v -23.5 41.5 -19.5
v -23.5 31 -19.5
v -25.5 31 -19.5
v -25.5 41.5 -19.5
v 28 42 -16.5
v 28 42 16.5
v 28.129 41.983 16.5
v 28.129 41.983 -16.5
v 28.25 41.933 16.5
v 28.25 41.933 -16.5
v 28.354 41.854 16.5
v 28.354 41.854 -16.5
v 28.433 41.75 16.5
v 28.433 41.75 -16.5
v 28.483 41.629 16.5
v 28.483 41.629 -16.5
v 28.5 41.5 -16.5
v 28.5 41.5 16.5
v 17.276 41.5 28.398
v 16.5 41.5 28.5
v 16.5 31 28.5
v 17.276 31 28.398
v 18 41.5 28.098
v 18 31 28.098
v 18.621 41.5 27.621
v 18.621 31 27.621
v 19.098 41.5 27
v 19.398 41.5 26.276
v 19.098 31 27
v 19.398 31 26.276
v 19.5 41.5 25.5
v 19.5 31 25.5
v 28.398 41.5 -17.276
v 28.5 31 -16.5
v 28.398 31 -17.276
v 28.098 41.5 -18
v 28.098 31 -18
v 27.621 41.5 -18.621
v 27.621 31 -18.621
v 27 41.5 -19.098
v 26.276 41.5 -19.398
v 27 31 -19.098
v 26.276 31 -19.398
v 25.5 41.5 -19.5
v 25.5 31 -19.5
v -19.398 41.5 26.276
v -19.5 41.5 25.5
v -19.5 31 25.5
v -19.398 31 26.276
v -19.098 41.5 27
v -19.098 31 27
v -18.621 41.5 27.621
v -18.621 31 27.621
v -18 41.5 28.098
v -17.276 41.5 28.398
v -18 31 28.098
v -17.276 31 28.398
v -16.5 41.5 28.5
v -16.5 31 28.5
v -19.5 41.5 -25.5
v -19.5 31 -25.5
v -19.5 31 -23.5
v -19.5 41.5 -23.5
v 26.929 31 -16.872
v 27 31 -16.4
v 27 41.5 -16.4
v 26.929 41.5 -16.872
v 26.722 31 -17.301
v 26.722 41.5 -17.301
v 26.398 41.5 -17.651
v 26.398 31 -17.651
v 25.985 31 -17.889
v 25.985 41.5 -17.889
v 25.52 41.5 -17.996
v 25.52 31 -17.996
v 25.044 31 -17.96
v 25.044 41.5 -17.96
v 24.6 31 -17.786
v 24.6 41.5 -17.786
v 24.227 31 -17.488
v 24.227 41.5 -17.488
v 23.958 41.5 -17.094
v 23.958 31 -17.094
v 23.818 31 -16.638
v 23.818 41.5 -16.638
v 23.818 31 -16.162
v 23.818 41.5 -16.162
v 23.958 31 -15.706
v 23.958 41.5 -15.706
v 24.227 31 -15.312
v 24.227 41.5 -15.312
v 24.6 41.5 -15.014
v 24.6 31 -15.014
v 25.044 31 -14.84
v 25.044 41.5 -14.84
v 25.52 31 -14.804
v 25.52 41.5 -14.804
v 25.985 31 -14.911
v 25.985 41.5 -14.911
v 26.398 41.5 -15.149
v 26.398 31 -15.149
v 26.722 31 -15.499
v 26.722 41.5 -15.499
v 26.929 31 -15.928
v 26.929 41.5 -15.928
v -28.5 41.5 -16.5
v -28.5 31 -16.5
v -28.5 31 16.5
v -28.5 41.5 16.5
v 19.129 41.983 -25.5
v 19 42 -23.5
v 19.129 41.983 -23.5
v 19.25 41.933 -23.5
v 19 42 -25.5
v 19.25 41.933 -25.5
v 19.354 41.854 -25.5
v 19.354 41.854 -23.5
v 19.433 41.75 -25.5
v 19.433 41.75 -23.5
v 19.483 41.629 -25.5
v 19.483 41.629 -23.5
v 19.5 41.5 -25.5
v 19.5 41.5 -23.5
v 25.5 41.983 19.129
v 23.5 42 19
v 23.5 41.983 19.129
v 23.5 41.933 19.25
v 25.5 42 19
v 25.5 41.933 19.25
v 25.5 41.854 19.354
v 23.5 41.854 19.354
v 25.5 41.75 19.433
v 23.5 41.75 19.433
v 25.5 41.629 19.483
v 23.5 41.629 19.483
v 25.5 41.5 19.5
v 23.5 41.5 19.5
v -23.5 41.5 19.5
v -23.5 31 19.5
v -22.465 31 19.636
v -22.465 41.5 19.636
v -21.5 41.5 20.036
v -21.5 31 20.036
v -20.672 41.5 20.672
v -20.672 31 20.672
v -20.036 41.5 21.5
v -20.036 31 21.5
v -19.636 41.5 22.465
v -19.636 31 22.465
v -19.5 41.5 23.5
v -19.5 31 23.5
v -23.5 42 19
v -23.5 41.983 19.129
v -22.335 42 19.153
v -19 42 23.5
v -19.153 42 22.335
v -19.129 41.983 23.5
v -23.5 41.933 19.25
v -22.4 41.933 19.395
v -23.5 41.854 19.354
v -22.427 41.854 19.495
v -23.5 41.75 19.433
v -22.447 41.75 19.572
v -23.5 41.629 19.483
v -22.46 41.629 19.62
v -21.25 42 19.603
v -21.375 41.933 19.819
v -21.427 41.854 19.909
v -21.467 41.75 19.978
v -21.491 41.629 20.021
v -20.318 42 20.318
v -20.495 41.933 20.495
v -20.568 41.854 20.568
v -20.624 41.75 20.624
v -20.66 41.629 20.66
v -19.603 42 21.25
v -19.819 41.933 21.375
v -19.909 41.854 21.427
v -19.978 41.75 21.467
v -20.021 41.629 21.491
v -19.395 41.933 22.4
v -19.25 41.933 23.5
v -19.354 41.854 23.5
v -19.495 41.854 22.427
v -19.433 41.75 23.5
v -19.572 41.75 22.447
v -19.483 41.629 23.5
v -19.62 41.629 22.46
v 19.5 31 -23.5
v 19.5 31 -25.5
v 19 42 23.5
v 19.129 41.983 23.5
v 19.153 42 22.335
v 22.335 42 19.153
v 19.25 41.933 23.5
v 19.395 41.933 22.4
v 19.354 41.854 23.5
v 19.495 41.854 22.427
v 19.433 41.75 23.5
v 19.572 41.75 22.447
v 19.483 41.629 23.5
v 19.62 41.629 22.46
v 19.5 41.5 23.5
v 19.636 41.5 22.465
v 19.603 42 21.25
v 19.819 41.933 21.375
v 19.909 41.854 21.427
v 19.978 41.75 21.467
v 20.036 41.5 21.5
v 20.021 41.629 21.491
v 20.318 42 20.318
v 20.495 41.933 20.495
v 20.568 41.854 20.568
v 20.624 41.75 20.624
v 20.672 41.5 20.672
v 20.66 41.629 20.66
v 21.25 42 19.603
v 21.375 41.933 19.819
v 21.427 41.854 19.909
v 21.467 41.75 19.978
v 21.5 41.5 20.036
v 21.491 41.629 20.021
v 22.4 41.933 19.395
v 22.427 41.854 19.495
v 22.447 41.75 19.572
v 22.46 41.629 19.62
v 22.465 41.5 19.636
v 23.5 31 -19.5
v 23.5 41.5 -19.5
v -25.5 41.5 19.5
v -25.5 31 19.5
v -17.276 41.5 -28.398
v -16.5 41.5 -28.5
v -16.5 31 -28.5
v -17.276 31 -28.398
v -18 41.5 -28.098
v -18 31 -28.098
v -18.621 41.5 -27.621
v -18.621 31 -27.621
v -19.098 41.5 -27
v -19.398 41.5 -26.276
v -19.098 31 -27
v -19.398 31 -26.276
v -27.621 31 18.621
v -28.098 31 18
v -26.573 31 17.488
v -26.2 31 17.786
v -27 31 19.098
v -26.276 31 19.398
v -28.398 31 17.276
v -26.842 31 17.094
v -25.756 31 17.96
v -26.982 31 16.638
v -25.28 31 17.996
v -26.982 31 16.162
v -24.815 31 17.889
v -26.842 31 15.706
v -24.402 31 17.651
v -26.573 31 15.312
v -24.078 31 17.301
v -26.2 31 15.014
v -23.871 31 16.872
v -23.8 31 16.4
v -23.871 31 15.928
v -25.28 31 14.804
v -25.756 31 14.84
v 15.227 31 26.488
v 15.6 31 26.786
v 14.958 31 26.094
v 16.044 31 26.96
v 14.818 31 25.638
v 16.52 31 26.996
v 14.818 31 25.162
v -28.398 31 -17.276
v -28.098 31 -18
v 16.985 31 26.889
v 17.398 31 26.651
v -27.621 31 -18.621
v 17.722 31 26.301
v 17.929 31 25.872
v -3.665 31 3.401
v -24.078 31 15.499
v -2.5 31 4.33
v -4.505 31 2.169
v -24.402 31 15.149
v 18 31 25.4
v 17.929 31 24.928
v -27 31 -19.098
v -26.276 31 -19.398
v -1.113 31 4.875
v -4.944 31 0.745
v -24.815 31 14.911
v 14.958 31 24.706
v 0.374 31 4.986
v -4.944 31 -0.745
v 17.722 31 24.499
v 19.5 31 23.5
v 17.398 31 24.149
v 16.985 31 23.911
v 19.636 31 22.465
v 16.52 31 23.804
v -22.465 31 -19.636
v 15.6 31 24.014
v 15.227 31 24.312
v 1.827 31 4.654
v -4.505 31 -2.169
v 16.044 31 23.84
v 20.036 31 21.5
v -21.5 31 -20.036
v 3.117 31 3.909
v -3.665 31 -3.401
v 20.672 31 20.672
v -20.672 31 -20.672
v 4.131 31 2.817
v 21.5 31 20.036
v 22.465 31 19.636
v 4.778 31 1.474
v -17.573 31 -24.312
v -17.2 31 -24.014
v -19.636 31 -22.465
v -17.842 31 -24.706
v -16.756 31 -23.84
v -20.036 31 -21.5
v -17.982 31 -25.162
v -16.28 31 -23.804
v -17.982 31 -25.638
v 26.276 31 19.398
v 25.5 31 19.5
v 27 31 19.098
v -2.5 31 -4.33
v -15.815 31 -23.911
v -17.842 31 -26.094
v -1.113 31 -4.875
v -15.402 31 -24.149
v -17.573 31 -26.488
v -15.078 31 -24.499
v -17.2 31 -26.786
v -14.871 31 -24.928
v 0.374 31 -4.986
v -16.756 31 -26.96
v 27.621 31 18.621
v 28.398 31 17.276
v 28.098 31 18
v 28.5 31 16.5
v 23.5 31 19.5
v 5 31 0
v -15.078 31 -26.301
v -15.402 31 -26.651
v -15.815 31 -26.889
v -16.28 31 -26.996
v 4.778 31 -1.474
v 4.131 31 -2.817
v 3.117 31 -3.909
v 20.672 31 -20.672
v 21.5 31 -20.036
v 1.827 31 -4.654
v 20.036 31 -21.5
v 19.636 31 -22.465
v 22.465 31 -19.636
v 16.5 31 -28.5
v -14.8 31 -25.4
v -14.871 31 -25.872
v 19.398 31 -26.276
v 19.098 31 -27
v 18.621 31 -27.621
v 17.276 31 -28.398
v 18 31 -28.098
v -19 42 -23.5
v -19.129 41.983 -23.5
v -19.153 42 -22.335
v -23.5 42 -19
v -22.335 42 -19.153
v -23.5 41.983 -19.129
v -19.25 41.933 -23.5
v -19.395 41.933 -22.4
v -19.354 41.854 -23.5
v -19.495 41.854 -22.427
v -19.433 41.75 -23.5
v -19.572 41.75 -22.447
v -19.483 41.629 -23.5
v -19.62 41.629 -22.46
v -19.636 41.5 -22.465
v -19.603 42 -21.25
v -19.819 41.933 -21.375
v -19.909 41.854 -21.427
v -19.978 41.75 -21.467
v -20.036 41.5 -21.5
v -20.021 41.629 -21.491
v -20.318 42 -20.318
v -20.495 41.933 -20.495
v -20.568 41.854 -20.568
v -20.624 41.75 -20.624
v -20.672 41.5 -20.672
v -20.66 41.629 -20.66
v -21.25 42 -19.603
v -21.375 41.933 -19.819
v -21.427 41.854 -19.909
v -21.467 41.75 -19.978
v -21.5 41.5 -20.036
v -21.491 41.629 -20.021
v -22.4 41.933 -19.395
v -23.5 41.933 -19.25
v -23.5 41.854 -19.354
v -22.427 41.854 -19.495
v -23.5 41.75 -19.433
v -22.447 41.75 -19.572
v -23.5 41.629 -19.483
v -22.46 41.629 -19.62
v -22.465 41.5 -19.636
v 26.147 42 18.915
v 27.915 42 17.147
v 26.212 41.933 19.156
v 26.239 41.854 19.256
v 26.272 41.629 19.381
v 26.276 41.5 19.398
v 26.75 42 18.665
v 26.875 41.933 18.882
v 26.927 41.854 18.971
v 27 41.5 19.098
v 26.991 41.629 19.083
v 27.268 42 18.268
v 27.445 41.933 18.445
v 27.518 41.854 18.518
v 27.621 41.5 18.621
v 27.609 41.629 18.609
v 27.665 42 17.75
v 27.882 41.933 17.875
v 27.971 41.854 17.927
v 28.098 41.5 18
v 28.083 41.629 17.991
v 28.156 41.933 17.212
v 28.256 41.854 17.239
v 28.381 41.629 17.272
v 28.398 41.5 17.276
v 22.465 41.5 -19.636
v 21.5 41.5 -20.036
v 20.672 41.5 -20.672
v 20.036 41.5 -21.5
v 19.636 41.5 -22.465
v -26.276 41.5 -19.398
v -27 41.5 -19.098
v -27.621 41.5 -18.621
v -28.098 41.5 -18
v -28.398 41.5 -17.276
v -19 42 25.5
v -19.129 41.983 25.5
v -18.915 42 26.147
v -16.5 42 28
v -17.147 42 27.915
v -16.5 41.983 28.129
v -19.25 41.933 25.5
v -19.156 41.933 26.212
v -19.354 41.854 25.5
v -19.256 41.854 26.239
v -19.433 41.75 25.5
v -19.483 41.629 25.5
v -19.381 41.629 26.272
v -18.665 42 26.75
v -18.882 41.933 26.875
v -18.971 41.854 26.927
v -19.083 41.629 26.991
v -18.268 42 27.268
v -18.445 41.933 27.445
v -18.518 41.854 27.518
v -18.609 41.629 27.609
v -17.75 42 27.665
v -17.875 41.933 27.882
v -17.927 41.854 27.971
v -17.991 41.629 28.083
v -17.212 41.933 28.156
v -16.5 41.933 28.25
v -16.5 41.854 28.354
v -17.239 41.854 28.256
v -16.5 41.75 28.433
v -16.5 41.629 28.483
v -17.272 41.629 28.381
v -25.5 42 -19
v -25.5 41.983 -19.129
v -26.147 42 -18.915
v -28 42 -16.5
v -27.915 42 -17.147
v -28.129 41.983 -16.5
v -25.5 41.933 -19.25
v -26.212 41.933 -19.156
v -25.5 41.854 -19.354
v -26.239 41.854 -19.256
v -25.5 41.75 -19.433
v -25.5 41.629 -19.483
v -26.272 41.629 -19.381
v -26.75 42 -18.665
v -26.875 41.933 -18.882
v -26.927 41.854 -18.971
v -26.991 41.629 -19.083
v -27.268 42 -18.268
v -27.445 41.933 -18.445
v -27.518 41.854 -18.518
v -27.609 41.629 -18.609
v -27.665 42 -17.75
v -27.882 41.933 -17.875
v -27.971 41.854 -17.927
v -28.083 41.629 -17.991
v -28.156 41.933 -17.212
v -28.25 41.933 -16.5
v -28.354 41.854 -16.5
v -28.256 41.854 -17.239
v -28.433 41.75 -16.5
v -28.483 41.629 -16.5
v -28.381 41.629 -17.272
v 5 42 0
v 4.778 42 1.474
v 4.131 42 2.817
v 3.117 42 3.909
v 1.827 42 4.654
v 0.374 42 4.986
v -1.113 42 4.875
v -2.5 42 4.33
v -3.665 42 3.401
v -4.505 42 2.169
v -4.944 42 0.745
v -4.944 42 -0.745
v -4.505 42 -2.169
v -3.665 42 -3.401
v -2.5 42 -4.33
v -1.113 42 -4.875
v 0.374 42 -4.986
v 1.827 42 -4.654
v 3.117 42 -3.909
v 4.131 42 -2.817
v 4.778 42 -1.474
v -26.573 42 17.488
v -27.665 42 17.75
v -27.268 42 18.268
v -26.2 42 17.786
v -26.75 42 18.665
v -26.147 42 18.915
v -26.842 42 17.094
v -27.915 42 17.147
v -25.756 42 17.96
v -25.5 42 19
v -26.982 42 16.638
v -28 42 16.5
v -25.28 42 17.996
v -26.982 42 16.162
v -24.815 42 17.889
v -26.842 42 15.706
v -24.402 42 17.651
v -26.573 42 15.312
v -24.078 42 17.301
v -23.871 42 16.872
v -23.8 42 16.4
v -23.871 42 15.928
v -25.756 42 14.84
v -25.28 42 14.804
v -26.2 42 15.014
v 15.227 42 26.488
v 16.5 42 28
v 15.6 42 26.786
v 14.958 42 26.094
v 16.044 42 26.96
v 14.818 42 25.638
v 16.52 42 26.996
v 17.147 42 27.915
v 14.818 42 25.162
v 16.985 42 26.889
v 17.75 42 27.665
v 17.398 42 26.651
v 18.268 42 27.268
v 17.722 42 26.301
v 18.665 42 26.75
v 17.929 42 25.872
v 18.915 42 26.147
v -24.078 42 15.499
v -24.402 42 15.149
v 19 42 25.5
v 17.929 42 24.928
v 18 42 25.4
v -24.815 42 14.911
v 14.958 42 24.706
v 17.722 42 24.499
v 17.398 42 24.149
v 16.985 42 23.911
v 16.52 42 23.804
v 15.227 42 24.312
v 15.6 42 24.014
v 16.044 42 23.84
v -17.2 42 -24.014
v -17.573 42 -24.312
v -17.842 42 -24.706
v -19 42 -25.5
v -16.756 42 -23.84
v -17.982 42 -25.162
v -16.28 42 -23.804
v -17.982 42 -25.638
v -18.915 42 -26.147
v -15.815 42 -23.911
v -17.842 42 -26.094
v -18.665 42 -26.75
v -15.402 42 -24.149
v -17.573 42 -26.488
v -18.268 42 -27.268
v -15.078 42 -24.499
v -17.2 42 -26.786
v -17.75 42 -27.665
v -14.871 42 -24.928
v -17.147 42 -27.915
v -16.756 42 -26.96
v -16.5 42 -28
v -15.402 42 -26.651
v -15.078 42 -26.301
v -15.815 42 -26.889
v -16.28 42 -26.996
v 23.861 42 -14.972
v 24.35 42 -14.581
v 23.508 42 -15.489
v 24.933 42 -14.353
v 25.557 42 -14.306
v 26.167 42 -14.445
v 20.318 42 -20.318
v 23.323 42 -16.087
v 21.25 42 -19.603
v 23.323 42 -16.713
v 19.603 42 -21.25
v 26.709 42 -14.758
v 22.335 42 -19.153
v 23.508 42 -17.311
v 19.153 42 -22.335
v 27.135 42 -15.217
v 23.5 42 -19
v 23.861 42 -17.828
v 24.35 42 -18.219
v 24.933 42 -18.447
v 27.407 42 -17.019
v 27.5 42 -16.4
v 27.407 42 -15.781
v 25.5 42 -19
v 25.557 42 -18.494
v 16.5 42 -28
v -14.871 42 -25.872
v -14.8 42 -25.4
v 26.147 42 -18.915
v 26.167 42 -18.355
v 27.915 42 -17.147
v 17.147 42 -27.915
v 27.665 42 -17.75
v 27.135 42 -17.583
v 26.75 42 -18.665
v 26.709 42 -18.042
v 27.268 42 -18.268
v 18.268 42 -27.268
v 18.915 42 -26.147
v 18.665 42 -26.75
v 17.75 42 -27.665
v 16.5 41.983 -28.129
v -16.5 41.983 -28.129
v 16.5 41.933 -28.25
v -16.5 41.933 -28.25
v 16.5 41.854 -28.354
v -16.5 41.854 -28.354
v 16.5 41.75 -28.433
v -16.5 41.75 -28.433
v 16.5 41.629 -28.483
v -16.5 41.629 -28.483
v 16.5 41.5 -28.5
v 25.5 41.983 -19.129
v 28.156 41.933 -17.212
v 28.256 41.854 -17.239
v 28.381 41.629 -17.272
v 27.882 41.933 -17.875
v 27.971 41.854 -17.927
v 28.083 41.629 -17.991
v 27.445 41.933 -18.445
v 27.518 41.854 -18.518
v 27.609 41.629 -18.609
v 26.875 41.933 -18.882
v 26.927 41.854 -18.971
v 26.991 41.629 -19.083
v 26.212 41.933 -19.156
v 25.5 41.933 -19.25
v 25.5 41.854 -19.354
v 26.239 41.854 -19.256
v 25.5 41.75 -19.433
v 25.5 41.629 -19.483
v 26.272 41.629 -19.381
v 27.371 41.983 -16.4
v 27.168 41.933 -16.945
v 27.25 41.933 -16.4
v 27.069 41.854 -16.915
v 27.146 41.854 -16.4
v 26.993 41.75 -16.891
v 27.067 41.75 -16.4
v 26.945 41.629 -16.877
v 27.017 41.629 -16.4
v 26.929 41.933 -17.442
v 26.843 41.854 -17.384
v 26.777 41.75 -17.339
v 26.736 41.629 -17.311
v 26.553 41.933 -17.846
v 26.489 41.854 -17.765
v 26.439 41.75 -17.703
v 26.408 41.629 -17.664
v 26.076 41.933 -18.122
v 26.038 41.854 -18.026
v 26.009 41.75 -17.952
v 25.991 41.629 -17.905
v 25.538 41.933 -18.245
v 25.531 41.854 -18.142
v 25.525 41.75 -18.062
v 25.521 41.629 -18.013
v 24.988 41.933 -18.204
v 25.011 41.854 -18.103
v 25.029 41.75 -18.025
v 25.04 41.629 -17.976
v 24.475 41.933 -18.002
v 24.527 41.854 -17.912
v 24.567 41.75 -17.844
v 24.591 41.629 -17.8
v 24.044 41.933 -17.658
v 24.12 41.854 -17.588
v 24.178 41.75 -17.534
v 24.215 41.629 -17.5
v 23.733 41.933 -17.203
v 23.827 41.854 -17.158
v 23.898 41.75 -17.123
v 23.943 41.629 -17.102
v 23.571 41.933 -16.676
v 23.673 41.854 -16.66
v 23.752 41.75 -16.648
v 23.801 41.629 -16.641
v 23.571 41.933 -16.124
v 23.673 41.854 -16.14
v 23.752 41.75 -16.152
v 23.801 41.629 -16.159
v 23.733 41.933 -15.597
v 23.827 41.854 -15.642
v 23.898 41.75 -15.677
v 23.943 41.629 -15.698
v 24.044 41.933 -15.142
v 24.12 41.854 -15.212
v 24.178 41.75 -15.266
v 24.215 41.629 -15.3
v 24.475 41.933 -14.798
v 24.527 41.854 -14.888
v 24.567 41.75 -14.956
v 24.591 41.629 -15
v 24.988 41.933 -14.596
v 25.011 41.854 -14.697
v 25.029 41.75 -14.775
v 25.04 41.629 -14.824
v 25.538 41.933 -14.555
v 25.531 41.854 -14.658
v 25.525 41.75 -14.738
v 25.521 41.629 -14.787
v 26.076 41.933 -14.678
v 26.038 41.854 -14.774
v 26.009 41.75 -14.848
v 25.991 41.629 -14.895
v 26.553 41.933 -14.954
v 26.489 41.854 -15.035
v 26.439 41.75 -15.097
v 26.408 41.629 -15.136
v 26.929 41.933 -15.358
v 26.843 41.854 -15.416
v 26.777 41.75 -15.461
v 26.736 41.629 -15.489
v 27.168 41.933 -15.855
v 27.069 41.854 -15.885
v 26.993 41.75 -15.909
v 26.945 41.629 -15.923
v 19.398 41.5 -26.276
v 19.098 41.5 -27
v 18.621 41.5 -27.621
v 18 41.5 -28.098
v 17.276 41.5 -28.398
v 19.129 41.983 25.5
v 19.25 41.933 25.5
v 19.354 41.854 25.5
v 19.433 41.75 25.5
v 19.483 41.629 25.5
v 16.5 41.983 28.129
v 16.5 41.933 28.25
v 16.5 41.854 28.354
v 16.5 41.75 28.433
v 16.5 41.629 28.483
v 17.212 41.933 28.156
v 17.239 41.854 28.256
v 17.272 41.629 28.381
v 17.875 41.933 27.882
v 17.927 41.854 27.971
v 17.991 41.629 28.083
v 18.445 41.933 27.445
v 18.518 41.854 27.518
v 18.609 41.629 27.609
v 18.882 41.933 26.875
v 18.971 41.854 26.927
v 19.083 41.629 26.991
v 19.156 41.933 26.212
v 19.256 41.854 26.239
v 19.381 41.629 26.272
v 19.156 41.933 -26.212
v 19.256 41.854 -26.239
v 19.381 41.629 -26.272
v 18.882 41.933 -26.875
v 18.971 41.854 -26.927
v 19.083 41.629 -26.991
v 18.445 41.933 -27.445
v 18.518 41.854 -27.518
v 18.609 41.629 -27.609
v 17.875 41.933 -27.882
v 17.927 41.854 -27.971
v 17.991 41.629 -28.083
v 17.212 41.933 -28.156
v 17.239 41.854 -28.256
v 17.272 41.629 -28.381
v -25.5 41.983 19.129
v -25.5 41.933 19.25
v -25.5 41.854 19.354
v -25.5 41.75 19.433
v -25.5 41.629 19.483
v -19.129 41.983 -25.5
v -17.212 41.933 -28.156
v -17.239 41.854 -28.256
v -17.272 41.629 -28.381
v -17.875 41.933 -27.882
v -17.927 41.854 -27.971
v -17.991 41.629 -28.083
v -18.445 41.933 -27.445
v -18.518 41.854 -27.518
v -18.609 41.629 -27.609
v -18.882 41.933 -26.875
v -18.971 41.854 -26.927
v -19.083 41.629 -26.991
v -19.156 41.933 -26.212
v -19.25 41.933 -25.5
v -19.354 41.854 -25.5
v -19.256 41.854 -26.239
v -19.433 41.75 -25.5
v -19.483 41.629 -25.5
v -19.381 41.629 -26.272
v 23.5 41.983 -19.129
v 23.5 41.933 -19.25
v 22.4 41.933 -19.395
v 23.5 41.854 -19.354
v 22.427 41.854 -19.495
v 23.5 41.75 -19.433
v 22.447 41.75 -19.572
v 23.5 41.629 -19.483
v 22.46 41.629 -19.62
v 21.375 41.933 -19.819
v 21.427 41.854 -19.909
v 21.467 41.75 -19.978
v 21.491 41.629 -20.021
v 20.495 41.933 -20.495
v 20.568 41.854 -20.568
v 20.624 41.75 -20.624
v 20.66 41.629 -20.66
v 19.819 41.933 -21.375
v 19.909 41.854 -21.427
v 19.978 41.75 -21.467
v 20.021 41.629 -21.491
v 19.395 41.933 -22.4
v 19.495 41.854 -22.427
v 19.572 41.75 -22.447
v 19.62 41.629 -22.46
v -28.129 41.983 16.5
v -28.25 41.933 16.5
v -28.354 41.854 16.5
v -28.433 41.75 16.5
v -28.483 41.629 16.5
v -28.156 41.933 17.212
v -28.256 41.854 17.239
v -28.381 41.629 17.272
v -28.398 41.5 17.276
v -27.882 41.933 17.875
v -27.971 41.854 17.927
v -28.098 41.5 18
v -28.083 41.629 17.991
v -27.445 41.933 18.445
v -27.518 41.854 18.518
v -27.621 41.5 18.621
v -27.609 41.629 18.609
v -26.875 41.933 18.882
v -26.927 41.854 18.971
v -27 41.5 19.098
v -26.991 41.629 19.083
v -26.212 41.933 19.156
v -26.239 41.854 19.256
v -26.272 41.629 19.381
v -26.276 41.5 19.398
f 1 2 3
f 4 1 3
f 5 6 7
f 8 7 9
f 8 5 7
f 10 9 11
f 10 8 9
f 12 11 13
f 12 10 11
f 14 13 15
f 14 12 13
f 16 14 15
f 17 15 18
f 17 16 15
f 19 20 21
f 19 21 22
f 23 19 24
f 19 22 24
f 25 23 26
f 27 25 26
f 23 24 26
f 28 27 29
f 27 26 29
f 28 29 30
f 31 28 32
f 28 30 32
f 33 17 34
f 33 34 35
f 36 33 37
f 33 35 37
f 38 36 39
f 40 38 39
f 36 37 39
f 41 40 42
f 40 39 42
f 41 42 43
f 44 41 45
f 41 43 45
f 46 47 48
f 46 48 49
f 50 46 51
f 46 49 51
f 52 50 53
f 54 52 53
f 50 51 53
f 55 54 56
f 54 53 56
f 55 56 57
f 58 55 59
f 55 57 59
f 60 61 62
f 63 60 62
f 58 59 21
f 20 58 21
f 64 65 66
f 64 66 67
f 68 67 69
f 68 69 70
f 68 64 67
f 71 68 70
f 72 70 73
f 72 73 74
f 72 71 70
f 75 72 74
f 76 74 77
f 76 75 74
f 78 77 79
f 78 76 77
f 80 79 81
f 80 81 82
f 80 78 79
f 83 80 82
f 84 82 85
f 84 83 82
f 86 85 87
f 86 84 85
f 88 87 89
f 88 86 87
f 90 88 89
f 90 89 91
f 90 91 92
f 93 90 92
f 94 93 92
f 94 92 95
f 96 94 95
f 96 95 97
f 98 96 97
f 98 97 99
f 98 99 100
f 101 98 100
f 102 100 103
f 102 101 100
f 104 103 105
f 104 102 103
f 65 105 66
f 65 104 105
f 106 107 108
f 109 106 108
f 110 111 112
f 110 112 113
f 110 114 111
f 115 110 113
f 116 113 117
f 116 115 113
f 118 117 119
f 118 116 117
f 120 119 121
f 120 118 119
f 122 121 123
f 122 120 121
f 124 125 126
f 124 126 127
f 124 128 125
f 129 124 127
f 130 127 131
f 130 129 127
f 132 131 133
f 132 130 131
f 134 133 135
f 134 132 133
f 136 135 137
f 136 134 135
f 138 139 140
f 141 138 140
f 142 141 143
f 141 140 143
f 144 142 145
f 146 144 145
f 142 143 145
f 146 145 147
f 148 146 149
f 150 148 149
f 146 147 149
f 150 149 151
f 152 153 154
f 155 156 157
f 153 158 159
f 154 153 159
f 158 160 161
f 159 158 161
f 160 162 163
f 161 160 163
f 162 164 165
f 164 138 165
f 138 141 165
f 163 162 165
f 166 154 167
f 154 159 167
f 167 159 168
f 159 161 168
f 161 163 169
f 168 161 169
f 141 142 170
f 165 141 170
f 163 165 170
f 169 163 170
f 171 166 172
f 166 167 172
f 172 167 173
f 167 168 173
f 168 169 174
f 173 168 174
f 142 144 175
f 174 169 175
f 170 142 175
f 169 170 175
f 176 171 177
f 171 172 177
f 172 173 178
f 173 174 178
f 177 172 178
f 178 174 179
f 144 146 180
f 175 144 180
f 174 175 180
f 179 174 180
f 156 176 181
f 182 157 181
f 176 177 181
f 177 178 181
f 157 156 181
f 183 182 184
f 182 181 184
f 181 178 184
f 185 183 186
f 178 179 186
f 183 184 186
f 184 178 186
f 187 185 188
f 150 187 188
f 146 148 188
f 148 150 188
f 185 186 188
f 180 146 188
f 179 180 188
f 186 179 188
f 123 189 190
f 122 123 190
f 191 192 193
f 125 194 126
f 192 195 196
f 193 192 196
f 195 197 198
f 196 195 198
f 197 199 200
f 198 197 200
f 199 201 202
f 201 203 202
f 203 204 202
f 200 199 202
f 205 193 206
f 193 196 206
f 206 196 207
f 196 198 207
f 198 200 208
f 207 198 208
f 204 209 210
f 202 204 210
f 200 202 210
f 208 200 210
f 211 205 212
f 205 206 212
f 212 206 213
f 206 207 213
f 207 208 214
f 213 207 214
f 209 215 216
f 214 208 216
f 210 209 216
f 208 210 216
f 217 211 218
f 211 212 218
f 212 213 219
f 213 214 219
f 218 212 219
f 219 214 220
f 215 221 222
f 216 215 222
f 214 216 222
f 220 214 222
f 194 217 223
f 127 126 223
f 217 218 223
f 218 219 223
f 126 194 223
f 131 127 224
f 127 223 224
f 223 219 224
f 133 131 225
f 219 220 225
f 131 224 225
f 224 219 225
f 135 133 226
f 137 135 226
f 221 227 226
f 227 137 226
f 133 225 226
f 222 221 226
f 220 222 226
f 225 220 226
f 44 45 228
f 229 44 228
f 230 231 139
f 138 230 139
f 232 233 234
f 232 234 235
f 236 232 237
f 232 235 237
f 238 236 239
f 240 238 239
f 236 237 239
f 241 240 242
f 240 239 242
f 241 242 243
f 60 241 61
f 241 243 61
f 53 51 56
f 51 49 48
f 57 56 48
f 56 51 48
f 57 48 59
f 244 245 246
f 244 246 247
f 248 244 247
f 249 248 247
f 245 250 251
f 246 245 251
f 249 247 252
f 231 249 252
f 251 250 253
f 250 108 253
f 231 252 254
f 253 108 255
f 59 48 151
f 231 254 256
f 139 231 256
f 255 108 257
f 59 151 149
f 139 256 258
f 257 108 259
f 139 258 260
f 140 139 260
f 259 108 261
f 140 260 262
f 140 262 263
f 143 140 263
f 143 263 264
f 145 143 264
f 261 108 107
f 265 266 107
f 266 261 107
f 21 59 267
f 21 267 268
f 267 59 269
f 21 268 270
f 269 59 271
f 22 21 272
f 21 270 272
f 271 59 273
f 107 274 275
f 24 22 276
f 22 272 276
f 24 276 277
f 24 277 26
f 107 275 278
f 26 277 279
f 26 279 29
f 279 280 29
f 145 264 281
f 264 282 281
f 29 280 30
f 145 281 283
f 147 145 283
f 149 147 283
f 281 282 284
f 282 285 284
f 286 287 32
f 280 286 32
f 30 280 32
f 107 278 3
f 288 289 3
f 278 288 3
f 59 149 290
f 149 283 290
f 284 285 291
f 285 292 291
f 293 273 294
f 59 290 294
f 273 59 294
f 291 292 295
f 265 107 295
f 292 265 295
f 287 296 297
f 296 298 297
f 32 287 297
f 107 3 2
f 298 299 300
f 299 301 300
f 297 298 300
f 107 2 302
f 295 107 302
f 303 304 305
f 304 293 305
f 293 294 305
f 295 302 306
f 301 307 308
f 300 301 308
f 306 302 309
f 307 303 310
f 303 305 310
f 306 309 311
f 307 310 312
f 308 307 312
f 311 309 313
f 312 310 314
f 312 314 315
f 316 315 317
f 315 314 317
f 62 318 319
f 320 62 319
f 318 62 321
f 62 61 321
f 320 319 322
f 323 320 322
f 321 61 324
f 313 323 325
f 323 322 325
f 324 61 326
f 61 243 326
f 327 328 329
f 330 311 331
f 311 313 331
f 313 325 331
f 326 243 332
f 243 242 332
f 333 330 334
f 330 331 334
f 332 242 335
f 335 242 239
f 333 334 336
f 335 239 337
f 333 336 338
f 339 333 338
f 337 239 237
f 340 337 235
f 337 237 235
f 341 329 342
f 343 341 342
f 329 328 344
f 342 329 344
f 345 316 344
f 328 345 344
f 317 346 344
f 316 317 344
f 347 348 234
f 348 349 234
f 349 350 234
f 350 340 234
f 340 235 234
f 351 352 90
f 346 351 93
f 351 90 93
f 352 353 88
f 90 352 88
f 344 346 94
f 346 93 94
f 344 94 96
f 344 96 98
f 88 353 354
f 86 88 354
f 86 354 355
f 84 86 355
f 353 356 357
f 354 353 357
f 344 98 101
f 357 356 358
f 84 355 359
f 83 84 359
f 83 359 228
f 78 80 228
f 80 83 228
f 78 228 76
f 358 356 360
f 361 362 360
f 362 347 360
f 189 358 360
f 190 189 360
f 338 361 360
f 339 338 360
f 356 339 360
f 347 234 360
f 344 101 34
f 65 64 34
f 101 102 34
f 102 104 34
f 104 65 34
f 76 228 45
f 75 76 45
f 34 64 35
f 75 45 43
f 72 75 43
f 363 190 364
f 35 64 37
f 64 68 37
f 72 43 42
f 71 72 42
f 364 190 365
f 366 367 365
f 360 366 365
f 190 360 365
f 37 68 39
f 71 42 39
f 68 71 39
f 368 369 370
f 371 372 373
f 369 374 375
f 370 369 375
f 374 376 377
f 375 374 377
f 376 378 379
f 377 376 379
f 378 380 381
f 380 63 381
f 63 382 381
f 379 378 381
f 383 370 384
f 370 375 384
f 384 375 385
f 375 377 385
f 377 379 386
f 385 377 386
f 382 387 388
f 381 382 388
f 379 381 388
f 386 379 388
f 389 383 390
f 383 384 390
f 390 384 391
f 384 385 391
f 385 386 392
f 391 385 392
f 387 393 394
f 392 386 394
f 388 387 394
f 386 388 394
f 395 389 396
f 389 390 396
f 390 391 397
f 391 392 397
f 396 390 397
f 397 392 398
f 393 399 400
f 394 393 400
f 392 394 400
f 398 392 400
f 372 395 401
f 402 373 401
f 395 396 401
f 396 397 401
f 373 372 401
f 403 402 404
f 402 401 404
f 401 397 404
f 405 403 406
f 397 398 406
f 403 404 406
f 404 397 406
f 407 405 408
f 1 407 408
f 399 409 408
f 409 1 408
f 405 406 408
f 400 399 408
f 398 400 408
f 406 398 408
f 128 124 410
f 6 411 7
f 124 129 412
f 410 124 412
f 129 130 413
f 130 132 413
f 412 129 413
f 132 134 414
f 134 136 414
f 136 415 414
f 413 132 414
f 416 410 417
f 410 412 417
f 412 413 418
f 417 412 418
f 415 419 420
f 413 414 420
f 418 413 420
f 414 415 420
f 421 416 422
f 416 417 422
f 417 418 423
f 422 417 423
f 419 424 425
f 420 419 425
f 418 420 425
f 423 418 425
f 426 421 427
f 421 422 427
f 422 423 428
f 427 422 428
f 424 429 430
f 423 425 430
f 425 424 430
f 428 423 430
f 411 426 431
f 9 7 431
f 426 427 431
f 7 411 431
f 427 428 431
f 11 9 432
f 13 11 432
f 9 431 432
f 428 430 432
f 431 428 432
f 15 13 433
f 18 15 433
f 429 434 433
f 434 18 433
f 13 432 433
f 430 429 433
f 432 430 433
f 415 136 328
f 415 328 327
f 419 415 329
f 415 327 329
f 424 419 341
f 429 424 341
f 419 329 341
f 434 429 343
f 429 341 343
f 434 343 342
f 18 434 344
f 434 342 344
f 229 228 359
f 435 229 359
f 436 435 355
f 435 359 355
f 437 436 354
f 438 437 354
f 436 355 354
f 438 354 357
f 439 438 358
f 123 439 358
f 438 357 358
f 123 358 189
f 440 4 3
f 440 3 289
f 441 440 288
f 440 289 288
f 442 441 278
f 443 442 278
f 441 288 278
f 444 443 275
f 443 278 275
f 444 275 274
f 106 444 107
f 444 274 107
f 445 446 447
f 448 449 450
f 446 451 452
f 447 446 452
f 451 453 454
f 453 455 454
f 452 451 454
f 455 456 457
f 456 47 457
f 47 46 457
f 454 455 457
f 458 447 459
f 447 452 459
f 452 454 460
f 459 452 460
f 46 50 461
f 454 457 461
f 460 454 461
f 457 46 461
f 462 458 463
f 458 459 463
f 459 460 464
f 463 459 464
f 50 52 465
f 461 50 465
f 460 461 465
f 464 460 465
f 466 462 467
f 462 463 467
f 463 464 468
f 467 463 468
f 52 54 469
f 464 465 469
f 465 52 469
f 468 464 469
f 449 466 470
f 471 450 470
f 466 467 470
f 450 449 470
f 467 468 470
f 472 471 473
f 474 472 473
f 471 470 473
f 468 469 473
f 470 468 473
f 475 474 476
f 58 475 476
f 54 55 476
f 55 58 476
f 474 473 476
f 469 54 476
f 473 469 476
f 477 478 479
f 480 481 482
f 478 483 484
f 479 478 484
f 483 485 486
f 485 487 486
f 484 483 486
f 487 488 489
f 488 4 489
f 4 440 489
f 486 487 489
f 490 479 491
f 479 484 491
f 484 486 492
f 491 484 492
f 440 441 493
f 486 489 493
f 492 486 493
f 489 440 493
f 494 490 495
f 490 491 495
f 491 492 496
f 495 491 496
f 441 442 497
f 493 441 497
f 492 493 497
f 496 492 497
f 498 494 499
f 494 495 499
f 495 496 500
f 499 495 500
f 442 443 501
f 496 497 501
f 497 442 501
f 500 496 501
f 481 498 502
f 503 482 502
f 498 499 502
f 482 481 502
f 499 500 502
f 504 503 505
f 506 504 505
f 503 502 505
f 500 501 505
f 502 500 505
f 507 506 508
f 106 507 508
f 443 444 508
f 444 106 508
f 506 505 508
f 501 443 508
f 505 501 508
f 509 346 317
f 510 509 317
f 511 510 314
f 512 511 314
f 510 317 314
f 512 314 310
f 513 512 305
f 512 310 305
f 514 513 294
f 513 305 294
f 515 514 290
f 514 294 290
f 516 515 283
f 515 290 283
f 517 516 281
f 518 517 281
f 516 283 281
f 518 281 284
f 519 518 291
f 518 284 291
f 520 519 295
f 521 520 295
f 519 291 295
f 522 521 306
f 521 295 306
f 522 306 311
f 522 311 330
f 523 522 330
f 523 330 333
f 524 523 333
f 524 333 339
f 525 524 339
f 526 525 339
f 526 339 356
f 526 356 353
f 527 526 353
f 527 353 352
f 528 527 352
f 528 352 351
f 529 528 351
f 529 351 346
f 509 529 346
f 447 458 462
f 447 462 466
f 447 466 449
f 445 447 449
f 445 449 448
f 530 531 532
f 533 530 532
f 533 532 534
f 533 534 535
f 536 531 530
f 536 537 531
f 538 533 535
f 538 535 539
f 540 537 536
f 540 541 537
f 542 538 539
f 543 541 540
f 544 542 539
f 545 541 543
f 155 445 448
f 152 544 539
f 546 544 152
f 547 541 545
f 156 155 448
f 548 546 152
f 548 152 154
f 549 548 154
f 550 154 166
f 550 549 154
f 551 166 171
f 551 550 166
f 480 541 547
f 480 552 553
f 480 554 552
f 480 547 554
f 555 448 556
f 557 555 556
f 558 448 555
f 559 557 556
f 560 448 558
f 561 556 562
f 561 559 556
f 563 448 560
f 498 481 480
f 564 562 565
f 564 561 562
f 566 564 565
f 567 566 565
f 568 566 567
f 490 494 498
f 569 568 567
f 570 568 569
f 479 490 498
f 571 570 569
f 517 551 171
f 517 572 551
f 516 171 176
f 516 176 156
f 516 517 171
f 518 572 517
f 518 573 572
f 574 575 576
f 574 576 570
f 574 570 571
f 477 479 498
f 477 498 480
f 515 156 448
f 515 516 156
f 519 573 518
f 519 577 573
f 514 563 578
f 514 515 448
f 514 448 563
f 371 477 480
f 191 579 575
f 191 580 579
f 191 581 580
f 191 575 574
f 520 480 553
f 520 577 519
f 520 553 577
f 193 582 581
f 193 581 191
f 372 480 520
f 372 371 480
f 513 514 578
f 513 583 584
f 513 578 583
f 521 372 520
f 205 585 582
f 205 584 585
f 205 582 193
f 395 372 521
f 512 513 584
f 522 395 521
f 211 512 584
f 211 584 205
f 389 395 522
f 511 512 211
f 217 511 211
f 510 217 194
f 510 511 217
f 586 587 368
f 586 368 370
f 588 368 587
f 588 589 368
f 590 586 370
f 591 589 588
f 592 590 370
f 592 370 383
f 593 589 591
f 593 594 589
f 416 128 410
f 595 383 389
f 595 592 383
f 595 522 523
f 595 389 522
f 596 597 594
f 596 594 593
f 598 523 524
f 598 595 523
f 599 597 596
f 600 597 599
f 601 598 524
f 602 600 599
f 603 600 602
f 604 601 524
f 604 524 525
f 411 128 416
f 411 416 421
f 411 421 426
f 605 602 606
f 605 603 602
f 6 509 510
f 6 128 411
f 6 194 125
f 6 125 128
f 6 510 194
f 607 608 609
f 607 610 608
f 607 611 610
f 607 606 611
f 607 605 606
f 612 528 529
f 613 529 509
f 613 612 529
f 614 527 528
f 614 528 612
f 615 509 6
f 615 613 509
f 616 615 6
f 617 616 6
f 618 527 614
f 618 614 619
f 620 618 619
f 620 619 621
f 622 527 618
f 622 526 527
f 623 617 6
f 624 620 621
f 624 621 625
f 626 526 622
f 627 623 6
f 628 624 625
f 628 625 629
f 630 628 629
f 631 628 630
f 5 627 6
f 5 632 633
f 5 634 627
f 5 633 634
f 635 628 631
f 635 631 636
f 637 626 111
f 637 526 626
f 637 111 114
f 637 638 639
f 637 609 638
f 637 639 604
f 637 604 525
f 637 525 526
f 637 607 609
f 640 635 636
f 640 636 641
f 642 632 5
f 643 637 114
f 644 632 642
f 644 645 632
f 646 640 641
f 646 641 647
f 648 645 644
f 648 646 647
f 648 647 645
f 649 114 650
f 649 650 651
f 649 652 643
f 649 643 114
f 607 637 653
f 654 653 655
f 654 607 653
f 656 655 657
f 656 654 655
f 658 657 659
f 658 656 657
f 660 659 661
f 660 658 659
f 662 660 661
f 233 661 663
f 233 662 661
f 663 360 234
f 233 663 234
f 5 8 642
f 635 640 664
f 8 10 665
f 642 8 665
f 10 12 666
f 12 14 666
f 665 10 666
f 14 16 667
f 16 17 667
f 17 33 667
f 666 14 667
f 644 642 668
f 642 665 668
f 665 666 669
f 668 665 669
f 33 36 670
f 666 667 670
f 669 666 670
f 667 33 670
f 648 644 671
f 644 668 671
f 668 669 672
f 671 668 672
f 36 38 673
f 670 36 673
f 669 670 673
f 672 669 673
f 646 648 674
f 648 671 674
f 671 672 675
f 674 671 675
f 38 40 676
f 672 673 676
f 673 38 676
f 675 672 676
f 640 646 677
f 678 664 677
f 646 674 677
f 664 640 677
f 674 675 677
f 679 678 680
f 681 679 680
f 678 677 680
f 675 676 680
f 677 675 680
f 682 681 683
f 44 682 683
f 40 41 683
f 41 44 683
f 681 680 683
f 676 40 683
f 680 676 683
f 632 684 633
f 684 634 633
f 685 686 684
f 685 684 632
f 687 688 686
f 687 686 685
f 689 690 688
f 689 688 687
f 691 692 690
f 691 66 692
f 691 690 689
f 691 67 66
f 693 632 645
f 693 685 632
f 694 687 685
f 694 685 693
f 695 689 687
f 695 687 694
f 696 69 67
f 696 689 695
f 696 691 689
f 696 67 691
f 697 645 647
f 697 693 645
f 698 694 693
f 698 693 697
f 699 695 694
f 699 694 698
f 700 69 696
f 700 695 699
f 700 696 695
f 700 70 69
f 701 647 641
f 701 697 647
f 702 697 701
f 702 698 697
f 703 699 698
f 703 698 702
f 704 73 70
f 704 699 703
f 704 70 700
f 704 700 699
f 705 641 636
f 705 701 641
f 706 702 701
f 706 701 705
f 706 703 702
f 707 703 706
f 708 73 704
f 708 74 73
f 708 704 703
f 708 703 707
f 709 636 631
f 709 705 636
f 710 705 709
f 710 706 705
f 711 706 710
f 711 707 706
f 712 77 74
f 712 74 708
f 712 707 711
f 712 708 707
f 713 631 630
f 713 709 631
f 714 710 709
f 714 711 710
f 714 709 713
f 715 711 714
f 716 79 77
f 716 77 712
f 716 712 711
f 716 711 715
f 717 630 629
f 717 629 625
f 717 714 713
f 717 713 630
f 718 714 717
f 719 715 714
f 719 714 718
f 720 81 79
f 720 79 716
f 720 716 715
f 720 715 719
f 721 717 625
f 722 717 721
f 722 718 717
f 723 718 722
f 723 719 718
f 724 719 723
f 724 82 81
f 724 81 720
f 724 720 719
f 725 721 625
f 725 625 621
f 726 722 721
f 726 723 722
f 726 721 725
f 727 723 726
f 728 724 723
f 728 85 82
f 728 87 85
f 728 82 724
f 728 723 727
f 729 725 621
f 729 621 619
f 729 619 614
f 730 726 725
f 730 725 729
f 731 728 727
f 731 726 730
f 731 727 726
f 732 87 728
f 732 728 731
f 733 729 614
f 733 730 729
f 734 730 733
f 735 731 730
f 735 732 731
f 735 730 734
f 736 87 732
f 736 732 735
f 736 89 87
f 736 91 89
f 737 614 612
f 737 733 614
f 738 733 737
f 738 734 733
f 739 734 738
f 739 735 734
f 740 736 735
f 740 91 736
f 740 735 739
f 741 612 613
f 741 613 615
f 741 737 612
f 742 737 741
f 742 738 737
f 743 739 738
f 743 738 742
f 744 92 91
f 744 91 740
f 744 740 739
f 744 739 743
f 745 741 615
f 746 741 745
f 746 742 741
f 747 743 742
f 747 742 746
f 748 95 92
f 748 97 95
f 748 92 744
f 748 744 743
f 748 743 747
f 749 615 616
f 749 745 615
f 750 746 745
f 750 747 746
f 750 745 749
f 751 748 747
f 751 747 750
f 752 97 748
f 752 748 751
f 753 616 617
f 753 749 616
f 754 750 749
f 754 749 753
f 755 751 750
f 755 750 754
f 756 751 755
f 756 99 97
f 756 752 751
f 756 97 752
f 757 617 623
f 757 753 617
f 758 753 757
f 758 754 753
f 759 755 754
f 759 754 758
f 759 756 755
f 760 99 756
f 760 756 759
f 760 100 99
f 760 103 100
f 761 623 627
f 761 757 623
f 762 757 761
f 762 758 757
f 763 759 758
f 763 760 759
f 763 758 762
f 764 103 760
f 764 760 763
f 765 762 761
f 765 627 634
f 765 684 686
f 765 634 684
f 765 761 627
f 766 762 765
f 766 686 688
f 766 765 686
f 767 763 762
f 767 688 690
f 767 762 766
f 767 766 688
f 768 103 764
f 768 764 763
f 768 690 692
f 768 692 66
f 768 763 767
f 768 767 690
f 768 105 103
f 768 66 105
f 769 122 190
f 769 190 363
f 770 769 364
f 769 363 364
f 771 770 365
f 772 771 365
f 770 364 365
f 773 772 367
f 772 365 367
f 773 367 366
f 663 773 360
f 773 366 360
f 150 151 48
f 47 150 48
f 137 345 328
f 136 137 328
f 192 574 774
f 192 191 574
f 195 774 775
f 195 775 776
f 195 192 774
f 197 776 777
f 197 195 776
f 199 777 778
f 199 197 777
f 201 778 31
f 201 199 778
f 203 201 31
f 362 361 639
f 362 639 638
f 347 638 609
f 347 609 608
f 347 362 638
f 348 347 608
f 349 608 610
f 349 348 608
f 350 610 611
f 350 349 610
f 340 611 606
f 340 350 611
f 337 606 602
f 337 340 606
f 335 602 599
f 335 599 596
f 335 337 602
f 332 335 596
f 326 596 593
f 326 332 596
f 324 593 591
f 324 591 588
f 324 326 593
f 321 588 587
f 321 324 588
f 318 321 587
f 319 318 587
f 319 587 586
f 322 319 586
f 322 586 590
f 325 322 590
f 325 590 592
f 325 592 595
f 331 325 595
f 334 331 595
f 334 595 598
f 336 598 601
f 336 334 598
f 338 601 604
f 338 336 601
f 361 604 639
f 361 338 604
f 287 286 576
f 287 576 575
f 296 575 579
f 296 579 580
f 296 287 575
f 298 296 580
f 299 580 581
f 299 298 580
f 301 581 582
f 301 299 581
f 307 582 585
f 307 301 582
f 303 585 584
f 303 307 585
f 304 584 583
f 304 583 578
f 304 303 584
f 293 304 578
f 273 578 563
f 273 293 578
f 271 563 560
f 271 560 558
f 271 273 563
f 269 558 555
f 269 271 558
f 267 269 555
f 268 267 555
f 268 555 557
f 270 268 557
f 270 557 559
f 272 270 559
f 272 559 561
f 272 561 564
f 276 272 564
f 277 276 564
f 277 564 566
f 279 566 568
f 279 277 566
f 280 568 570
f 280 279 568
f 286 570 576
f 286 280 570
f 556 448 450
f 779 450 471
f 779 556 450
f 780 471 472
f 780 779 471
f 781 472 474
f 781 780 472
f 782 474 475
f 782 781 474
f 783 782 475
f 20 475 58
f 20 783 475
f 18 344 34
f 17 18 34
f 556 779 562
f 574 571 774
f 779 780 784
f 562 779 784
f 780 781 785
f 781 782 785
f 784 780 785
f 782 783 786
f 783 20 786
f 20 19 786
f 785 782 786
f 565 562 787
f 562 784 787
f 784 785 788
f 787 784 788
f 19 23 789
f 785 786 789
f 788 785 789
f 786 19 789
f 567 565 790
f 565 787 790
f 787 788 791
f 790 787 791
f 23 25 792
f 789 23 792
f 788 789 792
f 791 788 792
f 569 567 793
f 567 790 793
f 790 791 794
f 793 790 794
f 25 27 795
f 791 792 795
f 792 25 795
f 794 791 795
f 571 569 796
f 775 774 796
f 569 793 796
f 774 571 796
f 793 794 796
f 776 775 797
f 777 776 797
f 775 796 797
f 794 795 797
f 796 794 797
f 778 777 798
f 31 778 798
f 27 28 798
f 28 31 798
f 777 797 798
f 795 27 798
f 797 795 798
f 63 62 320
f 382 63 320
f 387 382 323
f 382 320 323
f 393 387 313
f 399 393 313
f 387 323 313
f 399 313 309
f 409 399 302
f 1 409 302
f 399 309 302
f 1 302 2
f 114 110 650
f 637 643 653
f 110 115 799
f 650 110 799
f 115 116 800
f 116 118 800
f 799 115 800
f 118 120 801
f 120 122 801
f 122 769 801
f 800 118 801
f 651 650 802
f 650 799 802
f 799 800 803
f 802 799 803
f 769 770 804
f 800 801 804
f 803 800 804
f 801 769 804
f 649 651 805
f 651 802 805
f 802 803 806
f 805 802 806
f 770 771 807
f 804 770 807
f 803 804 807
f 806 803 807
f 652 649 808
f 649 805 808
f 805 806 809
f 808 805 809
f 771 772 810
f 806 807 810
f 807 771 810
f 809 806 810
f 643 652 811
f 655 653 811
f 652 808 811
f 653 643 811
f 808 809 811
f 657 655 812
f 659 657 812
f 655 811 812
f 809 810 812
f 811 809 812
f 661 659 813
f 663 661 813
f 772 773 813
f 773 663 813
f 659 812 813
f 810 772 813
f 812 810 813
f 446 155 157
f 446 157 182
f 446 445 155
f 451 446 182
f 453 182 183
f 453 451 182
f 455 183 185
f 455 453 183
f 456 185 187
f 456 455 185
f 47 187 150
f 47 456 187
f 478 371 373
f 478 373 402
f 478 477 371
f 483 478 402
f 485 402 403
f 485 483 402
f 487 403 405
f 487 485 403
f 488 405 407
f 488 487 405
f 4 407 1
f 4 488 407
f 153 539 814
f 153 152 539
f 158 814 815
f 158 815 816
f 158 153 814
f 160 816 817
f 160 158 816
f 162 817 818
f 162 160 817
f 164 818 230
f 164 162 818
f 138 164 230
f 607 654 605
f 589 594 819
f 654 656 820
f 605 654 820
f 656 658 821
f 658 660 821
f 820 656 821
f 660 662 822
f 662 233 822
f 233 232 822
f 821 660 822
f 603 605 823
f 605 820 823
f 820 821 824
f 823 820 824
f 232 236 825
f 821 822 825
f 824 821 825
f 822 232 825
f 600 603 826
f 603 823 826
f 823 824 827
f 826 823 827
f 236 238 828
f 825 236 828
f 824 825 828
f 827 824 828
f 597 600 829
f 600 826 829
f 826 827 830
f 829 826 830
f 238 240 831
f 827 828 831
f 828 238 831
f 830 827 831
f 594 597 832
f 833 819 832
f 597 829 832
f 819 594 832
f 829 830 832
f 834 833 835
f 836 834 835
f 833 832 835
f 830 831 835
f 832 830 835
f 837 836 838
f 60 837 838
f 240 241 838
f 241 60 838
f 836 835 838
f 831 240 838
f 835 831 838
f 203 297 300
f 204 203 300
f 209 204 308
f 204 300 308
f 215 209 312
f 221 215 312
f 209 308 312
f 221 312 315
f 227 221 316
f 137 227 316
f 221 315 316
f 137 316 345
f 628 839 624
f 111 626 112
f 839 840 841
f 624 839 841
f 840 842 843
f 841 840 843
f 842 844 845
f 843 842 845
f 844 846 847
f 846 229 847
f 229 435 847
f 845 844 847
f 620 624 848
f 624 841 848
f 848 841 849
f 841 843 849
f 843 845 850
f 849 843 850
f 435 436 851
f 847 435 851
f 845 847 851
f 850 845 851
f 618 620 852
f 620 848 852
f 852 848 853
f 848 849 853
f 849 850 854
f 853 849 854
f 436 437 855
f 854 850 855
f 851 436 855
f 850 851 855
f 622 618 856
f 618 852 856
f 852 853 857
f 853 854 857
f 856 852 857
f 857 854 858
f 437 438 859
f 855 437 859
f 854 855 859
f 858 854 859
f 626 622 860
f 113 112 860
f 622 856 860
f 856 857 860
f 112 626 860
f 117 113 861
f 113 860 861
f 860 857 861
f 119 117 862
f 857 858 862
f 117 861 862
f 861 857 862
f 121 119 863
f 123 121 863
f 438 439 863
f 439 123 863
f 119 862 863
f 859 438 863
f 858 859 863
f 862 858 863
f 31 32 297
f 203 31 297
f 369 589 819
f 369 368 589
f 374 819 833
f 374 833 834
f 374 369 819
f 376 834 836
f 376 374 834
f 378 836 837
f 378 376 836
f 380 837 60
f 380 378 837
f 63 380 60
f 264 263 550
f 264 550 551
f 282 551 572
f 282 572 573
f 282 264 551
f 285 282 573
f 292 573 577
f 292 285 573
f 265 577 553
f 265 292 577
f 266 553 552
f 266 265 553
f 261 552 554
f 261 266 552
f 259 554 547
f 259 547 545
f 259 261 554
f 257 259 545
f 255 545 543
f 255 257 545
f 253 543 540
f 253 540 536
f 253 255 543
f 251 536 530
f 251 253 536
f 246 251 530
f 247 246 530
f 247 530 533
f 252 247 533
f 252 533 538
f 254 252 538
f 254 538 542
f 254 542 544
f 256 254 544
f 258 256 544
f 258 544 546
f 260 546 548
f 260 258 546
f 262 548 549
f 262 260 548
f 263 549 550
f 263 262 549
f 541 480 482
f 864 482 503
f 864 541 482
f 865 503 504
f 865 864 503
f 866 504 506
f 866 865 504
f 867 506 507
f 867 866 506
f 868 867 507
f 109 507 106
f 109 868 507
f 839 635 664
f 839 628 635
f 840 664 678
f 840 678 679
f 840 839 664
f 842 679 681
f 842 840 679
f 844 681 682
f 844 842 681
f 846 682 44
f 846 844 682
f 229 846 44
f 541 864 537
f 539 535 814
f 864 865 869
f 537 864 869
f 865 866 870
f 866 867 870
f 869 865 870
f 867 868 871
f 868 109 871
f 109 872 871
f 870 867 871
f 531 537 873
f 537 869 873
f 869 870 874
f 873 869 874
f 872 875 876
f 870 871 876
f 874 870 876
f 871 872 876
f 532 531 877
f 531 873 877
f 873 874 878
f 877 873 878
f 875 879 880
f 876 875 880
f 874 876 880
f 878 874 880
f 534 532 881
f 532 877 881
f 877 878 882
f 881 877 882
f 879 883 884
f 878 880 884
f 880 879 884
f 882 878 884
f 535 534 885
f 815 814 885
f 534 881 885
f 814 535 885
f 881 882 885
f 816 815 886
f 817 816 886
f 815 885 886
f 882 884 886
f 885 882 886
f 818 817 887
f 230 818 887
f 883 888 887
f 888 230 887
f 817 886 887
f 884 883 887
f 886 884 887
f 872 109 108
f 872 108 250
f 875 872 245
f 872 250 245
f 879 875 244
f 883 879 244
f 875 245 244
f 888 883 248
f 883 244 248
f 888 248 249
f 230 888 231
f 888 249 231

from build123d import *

# Parameters (mm, degrees)
SHAPEBINDER001_R = 1.6
PAD008_DEPTH     = 11
SKETCH014_R      = 5
POCKET007_DEPTH  = 42.001
FILLET002_R      = 0.5


with BuildPart() as part:
    # ShapeBinder001 → Pad008 (new body)
    with BuildSketch(Plane(origin=(0, 31, 0), x_dir=(1, 0, 0), z_dir=(0, 1, 0))):
        with BuildLine():
            Line((-16.5, -28.5), (16.5, -28.5))
            ThreePointArc((16.5, -28.5), (18.62132, -27.62132), (19.5, -25.5))
            Line((19.5, -25.5), (19.5, -23.5))
            ThreePointArc((19.5, -23.5), (20.671573, -20.671573), (23.5, -19.5))
            Line((23.5, -19.5), (25.5, -19.5))
            ThreePointArc((25.5, -19.5), (27.62132, -18.62132), (28.5, -16.5))
            Line((28.5, -16.5), (28.5, 16.5))
            ThreePointArc((28.5, 16.5), (27.62132, 18.62132), (25.5, 19.5))
            Line((25.5, 19.5), (23.5, 19.5))
            ThreePointArc((23.5, 19.5), (20.671573, 20.671573), (19.5, 23.5))
            Line((19.5, 23.5), (19.5, 25.5))
            ThreePointArc((19.5, 25.5), (18.62132, 27.62132), (16.5, 28.5))
            Line((16.5, 28.5), (-16.5, 28.5))
            ThreePointArc((-16.5, 28.5), (-18.62132, 27.62132), (-19.5, 25.5))
            Line((-19.5, 25.5), (-19.5, 23.5))
            ThreePointArc((-19.5, 23.5), (-20.671573, 20.671573), (-23.5, 19.5))
            Line((-23.5, 19.5), (-25.5, 19.5))
            ThreePointArc((-25.5, 19.5), (-27.62132, 18.62132), (-28.5, 16.5))
            Line((-28.5, 16.5), (-28.5, -16.5))
            ThreePointArc((-28.5, -16.5), (-27.62132, -18.62132), (-25.5, -19.5))
            Line((-25.5, -19.5), (-23.5, -19.5))
            ThreePointArc((-23.5, -19.5), (-20.671573, -20.671573), (-19.5, -23.5))
            Line((-19.5, -23.5), (-19.5, -25.5))
            ThreePointArc((-19.5, -25.5), (-18.62132, -27.62132), (-16.5, -28.5))
        make_face()
        with Locations((-16.4, 25.4)):
            Circle(SHAPEBINDER001_R, mode=Mode.SUBTRACT)
        with Locations((-25.4, -16.4)):
            Circle(SHAPEBINDER001_R, mode=Mode.SUBTRACT)
        with Locations((25.4, 16.4)):
            Circle(SHAPEBINDER001_R, mode=Mode.SUBTRACT)
        with Locations((16.4, -25.4)):
            Circle(SHAPEBINDER001_R, mode=Mode.SUBTRACT)
    extrude(amount=PAD008_DEPTH)

    # Sketch014 → Pocket007 (cut, through all)
    with BuildSketch(Plane.XZ):
        Circle(SKETCH014_R)
    extrude(amount=-POCKET007_DEPTH, mode=Mode.SUBTRACT)

    # Fillet002
    fillet002_edges = [part.edges().sort_by_distance(p)[0] for p in [
        (20.671573, 42, -20.671573),
        (25.4, 42, -14.8),
    ]]
    fillet(fillet002_edges, radius=FILLET002_R)


solid = part.part
